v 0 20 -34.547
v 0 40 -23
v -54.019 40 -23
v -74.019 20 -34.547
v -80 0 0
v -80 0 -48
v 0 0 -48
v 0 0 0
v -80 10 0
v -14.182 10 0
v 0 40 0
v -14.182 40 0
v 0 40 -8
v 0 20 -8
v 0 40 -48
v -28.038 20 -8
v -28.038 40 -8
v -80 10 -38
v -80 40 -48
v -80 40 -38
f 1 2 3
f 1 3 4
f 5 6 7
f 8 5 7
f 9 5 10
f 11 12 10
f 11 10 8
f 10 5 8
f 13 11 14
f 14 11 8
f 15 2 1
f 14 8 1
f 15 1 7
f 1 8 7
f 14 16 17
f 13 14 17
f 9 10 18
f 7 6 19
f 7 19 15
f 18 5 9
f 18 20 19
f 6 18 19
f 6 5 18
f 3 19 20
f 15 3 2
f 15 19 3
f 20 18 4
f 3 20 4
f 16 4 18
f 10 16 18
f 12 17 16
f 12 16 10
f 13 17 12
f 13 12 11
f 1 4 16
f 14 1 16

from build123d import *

# Parameters (mm, degrees)
SKIZZE1_W                       = 80
SKIZZE1_H                       = 48
AUFSATZ_LINEAR_AUSTRAGEN1_DEPTH = 40
SCHNITT_LINEAR_AUSTRAGEN1_DEPTH = 30
SCHNITT_LINEAR_AUSTRAGEN2_DEPTH = 81


with BuildPart() as part:
    # Skizze1 → Aufsatz-Linear austragen1 (new body)
    with BuildSketch(Plane(origin=(0, 0, 0), x_dir=(1, 0, 0), z_dir=(0, 1, 0))):
        with Locations((-40, 24)):
            Rectangle(SKIZZE1_W, SKIZZE1_H)
    extrude(amount=AUFSATZ_LINEAR_AUSTRAGEN1_DEPTH)

    # Skizze2 → Schnitt-Linear austragen1 (cut)
    with BuildSketch(Plane(origin=(0, 40, 0), x_dir=(1, 0, 0), z_dir=(0, 1, 0))):
        Polygon((-80, 0), (-80, 38), (-14.182069312, 0), align=None)
    extrude(amount=-SCHNITT_LINEAR_AUSTRAGEN1_DEPTH, mode=Mode.SUBTRACT)

    # Skizze4 → Schnitt-Linear austragen2 (cut, through all)
    with BuildSketch(Plane(origin=(0, 0, 0), x_dir=(0, 0, -1), z_dir=(1, 0, 0))):
        Polygon((23, 40), (34.547005384, 20), (8, 20), (8, 40), align=None)
    extrude(amount=-SCHNITT_LINEAR_AUSTRAGEN2_DEPTH, mode=Mode.SUBTRACT)


solid = part.part
